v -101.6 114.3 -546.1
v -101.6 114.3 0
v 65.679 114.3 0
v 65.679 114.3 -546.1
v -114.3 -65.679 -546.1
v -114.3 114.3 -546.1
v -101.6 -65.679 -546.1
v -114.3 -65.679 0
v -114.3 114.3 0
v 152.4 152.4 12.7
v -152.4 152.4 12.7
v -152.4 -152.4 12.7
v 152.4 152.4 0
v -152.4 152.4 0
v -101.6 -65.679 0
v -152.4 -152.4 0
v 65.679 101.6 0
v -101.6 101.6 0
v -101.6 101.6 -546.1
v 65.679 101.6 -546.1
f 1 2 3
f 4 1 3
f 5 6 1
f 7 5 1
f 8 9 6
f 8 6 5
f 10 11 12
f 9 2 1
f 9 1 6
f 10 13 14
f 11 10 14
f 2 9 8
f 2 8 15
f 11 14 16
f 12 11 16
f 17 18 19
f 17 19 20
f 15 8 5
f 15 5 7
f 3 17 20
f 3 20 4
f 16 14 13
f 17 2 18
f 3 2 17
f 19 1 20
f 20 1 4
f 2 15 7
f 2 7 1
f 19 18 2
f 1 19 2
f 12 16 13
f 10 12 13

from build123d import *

# Parameters (mm, degrees)
F0_W     = 167.278976
F0_H     = 12.7
F1_DEPTH = 12.7
F2_DEPTH = 546.1
F3_DEPTH = 546.1


with BuildPart() as f1:
    # F0 (on Top) → F1 (new body)
    with BuildSketch(Plane.XY):
        Polygon((-152.4, -152.4), (152.4, 152.4), (-152.4, 152.4), align=None)
        Polygon((-114.3, -65.678976), (-114.3, 114.3), (-101.6, 114.3), (65.678976, 114.3), (65.678976, 101.6), (-101.6, 101.6), (-101.6, -65.678976), align=None, mode=Mode.SUBTRACT)
        Polygon((-101.6, 114.3), (-114.3, 114.3), (-114.3, -65.678976), (-101.6, -65.678976), (-101.6, 101.6), align=None)
        with Locations((-17.960512, 107.95)):
            Rectangle(F0_W, F0_H)
    extrude(amount=F1_DEPTH)


with BuildPart() as f2:
    # F0 (on Top) → F2 (new body)
    with BuildSketch(Plane.XY):
        Polygon((-101.6, 114.3), (-114.3, 114.3), (-114.3, -65.678976), (-101.6, -65.678976), (-101.6, 101.6), align=None)
    extrude(amount=-F2_DEPTH)


with BuildPart() as f3:
    # F0 (on Top) → F3 (new body, through all)
    with BuildSketch(Plane.XY):
        with Locations((-17.960512, 107.95)):
            Rectangle(F0_W, F0_H)
    extrude(amount=-F3_DEPTH)


solid = Compound([f1.part, f2.part, f3.part])
